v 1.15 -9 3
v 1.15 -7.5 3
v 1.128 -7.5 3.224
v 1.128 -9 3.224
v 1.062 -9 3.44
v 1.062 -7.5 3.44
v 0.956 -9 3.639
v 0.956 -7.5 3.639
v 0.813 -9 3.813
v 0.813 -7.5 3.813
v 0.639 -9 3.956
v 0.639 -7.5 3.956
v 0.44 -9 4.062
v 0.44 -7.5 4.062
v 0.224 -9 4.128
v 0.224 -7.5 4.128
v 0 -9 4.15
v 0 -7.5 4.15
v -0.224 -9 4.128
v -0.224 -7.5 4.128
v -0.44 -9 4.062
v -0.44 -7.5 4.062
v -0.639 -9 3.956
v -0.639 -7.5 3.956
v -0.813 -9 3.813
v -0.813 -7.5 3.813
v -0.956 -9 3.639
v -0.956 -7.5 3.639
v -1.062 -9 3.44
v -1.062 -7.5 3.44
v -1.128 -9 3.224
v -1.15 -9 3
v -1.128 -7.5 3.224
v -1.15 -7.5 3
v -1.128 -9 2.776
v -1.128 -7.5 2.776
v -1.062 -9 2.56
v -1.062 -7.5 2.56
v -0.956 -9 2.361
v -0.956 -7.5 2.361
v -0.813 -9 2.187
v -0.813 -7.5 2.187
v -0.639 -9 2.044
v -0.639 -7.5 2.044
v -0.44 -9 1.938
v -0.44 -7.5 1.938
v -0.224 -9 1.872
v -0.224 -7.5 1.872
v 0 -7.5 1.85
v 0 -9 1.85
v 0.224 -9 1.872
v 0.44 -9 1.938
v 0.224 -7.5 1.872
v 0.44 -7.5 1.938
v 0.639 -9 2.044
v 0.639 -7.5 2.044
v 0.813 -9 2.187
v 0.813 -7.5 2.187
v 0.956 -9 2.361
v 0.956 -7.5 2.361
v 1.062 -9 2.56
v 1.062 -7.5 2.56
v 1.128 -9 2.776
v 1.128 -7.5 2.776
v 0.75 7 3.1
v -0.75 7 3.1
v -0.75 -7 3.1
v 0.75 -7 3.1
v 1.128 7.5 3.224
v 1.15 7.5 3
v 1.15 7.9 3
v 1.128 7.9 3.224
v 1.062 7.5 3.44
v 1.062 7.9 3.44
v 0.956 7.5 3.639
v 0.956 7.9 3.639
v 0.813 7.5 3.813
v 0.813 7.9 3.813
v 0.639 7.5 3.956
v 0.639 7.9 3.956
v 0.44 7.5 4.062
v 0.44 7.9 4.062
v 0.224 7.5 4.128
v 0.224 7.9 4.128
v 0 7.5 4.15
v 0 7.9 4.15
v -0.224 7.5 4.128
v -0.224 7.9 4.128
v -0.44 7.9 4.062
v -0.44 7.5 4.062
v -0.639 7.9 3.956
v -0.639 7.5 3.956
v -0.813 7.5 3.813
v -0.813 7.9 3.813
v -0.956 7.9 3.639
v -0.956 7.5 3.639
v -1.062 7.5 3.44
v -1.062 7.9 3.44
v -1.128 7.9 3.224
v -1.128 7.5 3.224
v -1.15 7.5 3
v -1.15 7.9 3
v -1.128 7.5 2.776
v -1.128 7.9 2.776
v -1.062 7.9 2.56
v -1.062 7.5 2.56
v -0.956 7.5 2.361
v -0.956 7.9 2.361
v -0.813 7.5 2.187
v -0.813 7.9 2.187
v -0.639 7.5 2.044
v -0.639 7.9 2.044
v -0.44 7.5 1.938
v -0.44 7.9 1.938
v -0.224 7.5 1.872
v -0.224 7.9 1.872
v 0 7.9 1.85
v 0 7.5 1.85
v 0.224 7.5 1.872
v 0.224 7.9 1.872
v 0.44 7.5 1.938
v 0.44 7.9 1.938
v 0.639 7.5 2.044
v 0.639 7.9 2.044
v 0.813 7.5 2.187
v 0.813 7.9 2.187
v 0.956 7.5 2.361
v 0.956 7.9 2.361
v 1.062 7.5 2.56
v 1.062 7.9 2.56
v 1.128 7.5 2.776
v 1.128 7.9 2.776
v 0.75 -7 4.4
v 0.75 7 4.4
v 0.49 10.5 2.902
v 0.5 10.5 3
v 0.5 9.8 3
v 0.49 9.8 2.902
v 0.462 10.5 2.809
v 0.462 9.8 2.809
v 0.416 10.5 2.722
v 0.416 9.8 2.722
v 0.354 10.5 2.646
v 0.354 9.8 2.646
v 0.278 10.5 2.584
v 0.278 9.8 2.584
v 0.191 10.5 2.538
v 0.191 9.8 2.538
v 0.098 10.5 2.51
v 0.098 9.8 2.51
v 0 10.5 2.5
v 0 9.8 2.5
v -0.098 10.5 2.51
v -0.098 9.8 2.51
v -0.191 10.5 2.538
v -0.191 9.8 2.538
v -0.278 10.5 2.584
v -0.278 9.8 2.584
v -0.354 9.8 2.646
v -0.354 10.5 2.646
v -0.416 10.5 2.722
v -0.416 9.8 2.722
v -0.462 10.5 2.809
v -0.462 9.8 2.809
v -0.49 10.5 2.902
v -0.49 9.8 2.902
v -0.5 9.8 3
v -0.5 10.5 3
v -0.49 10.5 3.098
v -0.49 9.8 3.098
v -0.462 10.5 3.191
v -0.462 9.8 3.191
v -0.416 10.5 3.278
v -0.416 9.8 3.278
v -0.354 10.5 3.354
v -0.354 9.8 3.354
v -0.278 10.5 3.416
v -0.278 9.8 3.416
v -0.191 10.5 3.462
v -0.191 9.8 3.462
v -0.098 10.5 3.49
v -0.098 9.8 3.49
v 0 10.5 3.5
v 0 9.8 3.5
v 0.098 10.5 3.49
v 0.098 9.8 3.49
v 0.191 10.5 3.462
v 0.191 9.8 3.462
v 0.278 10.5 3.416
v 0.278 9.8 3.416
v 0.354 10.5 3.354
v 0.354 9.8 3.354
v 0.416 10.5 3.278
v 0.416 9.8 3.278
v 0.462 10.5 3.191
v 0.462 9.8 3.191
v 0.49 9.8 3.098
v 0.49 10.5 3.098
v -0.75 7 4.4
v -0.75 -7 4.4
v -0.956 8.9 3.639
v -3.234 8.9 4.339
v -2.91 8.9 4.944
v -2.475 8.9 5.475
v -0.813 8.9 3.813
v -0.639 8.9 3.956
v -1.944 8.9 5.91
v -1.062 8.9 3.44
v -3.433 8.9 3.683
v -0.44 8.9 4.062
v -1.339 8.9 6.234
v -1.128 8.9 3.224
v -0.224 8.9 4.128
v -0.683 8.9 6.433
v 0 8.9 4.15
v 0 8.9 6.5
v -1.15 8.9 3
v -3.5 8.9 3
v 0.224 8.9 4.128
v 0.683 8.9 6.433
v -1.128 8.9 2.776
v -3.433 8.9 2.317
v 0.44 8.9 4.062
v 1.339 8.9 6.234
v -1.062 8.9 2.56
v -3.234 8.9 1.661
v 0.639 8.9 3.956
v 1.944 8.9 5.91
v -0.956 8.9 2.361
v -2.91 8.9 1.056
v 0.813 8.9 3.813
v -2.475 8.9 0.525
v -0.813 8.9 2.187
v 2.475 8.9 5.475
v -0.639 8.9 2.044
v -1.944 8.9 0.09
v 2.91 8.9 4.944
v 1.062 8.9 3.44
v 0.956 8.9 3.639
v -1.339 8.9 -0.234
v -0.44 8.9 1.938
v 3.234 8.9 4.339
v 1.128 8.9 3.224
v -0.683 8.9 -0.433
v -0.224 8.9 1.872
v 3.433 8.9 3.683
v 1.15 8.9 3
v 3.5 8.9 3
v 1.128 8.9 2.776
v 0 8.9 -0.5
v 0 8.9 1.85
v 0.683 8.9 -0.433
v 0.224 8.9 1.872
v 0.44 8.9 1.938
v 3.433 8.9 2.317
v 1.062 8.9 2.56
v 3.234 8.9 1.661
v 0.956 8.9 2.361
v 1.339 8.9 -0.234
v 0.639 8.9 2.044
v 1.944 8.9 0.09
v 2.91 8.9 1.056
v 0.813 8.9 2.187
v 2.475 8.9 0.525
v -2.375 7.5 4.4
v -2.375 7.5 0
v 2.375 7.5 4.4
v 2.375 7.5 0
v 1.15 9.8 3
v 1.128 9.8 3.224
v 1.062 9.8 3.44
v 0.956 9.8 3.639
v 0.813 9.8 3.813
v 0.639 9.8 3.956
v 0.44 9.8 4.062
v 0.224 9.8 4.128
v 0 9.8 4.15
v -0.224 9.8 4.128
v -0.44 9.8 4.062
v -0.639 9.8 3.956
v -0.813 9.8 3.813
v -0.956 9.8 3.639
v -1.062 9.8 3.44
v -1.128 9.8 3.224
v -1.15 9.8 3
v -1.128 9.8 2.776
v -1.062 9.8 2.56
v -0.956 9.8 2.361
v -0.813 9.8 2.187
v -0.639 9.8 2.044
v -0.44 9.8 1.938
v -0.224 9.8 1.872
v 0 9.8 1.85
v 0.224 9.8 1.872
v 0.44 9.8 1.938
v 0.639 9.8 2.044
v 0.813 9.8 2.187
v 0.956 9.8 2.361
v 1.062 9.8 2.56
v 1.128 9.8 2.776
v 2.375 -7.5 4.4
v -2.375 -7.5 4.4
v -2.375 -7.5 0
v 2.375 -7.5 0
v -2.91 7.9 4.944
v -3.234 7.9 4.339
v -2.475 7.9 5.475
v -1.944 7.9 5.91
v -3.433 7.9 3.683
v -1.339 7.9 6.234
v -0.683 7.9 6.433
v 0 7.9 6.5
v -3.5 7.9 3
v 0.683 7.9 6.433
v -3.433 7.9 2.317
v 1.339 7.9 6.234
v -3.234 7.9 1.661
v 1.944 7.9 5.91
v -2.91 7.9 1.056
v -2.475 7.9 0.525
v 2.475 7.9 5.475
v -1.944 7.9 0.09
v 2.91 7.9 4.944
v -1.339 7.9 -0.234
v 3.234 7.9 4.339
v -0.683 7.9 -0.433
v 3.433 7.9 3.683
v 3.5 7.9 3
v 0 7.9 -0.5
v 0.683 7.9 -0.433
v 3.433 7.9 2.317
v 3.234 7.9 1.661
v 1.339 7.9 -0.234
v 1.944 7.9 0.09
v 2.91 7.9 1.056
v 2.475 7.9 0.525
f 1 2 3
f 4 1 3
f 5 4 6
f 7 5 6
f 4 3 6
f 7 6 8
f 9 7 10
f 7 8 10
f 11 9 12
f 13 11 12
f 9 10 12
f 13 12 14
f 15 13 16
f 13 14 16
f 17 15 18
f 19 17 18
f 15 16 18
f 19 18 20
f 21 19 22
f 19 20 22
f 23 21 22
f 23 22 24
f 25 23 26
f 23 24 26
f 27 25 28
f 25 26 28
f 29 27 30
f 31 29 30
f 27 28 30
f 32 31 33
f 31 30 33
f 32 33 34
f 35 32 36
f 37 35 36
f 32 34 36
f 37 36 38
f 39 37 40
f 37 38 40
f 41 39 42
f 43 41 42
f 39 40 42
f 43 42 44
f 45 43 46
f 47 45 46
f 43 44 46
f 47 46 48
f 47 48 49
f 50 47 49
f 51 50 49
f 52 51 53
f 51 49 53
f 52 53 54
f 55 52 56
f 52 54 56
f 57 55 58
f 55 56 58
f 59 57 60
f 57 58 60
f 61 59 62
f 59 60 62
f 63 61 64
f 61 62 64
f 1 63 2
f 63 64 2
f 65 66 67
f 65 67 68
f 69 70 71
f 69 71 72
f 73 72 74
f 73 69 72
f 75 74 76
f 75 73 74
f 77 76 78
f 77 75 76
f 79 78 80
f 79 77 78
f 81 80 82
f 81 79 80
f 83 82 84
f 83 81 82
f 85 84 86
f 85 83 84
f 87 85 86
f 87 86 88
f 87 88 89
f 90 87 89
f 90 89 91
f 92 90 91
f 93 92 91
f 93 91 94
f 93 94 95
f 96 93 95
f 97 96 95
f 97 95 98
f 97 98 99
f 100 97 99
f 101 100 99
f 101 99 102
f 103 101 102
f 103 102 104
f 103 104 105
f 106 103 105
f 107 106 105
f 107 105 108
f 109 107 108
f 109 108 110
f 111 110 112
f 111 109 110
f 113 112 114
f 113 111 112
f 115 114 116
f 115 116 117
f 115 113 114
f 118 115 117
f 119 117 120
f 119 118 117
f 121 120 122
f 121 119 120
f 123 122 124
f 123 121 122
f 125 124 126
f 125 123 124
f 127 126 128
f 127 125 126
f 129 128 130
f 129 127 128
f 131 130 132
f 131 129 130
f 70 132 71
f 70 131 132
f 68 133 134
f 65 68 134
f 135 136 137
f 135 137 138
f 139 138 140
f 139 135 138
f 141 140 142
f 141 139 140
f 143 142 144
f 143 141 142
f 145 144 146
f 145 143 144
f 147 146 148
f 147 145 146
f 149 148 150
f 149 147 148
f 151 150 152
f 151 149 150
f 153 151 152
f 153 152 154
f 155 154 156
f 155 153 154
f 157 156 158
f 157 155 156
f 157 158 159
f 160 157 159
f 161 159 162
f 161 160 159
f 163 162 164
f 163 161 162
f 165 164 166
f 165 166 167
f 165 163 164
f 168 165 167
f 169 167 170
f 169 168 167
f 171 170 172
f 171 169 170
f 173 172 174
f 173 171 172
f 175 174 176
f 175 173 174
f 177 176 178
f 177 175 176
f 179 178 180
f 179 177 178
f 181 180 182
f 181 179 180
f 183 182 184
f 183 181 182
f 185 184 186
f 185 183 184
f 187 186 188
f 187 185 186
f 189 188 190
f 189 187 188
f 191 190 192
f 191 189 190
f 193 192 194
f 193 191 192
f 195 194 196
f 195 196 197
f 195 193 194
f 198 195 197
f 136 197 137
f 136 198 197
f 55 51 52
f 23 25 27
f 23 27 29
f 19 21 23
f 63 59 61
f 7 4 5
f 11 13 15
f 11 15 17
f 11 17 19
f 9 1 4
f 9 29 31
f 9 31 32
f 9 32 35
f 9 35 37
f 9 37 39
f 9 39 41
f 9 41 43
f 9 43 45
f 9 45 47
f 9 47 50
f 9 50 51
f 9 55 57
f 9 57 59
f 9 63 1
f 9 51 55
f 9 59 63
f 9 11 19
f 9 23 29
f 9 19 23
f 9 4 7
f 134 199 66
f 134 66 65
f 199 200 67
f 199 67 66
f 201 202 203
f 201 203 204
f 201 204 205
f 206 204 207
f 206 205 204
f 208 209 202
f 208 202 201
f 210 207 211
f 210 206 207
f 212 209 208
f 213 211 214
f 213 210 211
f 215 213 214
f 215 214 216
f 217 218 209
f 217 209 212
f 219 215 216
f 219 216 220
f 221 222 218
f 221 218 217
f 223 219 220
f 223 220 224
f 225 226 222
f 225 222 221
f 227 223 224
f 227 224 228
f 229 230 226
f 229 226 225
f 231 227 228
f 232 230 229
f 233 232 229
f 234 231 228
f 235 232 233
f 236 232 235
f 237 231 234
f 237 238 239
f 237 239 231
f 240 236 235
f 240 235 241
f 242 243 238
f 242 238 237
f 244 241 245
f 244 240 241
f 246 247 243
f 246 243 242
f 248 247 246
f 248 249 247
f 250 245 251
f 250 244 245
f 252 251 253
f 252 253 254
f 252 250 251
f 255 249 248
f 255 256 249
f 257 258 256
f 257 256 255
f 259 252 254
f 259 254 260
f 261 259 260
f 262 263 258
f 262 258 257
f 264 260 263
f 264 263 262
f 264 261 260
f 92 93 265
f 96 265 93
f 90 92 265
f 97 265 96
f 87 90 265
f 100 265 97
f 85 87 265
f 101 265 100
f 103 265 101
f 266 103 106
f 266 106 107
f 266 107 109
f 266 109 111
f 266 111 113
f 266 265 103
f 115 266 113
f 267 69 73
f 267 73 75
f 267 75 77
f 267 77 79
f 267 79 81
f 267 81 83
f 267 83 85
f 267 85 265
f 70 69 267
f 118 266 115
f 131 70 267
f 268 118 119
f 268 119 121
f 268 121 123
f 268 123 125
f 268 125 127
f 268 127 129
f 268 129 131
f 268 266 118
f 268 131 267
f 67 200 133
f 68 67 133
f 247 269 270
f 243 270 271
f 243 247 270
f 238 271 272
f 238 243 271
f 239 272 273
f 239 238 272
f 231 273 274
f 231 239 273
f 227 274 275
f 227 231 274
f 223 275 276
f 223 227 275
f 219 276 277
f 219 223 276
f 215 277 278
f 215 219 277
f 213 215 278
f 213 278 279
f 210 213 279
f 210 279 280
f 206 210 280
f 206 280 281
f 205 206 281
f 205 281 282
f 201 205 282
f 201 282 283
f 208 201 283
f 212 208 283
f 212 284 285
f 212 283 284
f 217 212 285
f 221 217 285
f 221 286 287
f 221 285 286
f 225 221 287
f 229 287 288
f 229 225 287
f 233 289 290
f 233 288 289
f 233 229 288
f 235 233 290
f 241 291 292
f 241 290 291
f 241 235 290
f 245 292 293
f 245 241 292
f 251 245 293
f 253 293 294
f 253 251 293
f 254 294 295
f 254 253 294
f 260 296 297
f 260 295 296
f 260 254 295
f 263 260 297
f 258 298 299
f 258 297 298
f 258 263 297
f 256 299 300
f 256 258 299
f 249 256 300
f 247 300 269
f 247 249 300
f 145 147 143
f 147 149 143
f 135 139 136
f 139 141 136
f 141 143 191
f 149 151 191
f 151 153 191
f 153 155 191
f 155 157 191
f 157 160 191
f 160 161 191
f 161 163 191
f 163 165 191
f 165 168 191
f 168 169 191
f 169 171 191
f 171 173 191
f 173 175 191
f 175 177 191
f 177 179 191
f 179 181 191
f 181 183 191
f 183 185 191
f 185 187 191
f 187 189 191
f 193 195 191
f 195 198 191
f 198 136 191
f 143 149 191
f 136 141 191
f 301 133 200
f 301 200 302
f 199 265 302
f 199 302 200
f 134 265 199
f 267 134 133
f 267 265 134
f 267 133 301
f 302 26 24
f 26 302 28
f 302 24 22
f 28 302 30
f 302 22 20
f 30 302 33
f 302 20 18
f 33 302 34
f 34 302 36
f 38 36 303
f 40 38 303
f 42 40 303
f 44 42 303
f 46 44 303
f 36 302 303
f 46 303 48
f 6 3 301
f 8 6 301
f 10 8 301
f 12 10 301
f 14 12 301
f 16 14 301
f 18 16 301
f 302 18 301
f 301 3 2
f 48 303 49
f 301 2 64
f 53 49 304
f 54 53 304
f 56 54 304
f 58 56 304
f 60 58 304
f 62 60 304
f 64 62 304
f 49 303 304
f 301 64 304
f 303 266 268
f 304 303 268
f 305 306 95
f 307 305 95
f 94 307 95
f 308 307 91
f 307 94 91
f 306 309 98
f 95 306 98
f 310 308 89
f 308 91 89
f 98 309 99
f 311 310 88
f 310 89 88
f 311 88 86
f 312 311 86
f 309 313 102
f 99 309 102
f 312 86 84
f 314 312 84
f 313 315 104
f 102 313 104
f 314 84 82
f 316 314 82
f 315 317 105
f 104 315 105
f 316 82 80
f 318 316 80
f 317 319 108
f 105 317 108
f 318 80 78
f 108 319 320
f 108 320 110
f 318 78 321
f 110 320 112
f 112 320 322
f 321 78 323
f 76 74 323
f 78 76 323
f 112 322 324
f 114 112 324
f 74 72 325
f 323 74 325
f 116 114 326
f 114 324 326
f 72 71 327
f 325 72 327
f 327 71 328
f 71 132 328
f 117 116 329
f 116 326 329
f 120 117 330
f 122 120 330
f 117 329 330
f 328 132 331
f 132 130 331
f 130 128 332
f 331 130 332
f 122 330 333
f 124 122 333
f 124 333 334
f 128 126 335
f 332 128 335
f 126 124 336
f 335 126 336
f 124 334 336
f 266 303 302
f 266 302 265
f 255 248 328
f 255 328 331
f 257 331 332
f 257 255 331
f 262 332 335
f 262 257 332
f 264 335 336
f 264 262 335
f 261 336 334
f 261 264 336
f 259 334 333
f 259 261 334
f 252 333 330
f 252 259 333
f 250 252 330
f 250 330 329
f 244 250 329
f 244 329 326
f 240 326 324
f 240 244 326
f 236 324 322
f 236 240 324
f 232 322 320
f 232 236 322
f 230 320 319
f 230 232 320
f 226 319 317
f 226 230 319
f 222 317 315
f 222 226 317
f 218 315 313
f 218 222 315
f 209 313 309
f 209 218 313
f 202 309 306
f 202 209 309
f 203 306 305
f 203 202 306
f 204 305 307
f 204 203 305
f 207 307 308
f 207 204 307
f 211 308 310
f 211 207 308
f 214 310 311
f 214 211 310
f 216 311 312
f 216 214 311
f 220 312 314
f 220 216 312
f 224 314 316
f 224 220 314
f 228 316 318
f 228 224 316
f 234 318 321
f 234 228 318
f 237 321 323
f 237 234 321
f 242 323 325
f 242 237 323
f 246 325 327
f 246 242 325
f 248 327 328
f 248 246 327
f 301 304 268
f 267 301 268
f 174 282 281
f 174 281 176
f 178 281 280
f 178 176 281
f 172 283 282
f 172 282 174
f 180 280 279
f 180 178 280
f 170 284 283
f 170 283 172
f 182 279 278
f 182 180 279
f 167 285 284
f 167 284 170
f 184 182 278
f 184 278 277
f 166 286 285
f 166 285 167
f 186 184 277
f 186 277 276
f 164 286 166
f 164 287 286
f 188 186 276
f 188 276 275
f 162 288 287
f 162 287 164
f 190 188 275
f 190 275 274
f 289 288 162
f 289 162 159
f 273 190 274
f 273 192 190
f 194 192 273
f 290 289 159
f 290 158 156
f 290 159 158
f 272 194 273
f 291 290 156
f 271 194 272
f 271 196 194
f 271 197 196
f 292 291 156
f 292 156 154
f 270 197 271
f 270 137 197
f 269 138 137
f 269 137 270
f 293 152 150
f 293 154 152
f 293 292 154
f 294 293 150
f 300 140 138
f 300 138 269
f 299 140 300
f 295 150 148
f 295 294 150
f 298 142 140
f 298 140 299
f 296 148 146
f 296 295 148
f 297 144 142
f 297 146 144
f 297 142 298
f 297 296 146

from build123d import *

# Parameters (mm, degrees)
ESBO_O1_W                     = 4.75
ESBO_O1_H                     = 15
RESSALTO_EXTRUS_O1_DEPTH      = 4.4
ESBO_O2_R                     = 1.15
RESSALTO_EXTRUS_O2_DEPTH      = 1.5
RESSALTO_EXTRUS_O2_DEPTH_BACK = 18
ESBO_O3_R                     = 3.5
RESSALTO_EXTRUS_O3_DEPTH      = 1
ESBO_O4_R                     = 1.15
ESBO_O4_R_2                   = 0.5
CORTE_EXTRUS_O1_DEPTH         = 0.7
ESBO_O5_W                     = 1.5
ESBO_O5_H                     = 14
CORTE_EXTRUS_O2_DEPTH         = 1.3


with BuildPart() as part:
    # Esboço1 → Ressalto-extrusão1 (new body)
    with BuildSketch(Plane.XY):
        Rectangle(ESBO_O1_W, ESBO_O1_H)
    extrude(amount=RESSALTO_EXTRUS_O1_DEPTH)

    # Esboço2 → Ressalto-extrusão2 (add, two sides)
    with BuildSketch(Plane.XZ.offset(7.5)) as ressalto_extrus_o2_sk:
        with Locations((0, 3)):
            Circle(ESBO_O2_R)
    extrude(amount=RESSALTO_EXTRUS_O2_DEPTH)
    extrude(ressalto_extrus_o2_sk.sketch, amount=-RESSALTO_EXTRUS_O2_DEPTH_BACK)

    # Esboço3 → Ressalto-extrusão3 (add)
    with BuildSketch(Plane(origin=(0, 8.9, 0), x_dir=(1, 0, 0), z_dir=(0, 1, 0))):
        with Locations((0, -3)):
            Circle(ESBO_O3_R)
    extrude(amount=-RESSALTO_EXTRUS_O3_DEPTH)

    # Esboço4 → Corte-extrusão1 (cut)
    with BuildSketch(Plane(origin=(0, 10.5, 0), x_dir=(1, 0, 0), z_dir=(0, 1, 0))):
        with Locations((0, -3)):
            Circle(ESBO_O4_R)
        with Locations((0, -3)):
            Circle(ESBO_O4_R_2, mode=Mode.SUBTRACT)
    extrude(amount=-CORTE_EXTRUS_O1_DEPTH, mode=Mode.SUBTRACT)

    # Esboço5 → Corte-extrusão2 (cut)
    with BuildSketch(Plane.XY.offset(4.4)):
        Rectangle(ESBO_O5_W, ESBO_O5_H)
    extrude(amount=-CORTE_EXTRUS_O2_DEPTH, mode=Mode.SUBTRACT)


solid = part.part
